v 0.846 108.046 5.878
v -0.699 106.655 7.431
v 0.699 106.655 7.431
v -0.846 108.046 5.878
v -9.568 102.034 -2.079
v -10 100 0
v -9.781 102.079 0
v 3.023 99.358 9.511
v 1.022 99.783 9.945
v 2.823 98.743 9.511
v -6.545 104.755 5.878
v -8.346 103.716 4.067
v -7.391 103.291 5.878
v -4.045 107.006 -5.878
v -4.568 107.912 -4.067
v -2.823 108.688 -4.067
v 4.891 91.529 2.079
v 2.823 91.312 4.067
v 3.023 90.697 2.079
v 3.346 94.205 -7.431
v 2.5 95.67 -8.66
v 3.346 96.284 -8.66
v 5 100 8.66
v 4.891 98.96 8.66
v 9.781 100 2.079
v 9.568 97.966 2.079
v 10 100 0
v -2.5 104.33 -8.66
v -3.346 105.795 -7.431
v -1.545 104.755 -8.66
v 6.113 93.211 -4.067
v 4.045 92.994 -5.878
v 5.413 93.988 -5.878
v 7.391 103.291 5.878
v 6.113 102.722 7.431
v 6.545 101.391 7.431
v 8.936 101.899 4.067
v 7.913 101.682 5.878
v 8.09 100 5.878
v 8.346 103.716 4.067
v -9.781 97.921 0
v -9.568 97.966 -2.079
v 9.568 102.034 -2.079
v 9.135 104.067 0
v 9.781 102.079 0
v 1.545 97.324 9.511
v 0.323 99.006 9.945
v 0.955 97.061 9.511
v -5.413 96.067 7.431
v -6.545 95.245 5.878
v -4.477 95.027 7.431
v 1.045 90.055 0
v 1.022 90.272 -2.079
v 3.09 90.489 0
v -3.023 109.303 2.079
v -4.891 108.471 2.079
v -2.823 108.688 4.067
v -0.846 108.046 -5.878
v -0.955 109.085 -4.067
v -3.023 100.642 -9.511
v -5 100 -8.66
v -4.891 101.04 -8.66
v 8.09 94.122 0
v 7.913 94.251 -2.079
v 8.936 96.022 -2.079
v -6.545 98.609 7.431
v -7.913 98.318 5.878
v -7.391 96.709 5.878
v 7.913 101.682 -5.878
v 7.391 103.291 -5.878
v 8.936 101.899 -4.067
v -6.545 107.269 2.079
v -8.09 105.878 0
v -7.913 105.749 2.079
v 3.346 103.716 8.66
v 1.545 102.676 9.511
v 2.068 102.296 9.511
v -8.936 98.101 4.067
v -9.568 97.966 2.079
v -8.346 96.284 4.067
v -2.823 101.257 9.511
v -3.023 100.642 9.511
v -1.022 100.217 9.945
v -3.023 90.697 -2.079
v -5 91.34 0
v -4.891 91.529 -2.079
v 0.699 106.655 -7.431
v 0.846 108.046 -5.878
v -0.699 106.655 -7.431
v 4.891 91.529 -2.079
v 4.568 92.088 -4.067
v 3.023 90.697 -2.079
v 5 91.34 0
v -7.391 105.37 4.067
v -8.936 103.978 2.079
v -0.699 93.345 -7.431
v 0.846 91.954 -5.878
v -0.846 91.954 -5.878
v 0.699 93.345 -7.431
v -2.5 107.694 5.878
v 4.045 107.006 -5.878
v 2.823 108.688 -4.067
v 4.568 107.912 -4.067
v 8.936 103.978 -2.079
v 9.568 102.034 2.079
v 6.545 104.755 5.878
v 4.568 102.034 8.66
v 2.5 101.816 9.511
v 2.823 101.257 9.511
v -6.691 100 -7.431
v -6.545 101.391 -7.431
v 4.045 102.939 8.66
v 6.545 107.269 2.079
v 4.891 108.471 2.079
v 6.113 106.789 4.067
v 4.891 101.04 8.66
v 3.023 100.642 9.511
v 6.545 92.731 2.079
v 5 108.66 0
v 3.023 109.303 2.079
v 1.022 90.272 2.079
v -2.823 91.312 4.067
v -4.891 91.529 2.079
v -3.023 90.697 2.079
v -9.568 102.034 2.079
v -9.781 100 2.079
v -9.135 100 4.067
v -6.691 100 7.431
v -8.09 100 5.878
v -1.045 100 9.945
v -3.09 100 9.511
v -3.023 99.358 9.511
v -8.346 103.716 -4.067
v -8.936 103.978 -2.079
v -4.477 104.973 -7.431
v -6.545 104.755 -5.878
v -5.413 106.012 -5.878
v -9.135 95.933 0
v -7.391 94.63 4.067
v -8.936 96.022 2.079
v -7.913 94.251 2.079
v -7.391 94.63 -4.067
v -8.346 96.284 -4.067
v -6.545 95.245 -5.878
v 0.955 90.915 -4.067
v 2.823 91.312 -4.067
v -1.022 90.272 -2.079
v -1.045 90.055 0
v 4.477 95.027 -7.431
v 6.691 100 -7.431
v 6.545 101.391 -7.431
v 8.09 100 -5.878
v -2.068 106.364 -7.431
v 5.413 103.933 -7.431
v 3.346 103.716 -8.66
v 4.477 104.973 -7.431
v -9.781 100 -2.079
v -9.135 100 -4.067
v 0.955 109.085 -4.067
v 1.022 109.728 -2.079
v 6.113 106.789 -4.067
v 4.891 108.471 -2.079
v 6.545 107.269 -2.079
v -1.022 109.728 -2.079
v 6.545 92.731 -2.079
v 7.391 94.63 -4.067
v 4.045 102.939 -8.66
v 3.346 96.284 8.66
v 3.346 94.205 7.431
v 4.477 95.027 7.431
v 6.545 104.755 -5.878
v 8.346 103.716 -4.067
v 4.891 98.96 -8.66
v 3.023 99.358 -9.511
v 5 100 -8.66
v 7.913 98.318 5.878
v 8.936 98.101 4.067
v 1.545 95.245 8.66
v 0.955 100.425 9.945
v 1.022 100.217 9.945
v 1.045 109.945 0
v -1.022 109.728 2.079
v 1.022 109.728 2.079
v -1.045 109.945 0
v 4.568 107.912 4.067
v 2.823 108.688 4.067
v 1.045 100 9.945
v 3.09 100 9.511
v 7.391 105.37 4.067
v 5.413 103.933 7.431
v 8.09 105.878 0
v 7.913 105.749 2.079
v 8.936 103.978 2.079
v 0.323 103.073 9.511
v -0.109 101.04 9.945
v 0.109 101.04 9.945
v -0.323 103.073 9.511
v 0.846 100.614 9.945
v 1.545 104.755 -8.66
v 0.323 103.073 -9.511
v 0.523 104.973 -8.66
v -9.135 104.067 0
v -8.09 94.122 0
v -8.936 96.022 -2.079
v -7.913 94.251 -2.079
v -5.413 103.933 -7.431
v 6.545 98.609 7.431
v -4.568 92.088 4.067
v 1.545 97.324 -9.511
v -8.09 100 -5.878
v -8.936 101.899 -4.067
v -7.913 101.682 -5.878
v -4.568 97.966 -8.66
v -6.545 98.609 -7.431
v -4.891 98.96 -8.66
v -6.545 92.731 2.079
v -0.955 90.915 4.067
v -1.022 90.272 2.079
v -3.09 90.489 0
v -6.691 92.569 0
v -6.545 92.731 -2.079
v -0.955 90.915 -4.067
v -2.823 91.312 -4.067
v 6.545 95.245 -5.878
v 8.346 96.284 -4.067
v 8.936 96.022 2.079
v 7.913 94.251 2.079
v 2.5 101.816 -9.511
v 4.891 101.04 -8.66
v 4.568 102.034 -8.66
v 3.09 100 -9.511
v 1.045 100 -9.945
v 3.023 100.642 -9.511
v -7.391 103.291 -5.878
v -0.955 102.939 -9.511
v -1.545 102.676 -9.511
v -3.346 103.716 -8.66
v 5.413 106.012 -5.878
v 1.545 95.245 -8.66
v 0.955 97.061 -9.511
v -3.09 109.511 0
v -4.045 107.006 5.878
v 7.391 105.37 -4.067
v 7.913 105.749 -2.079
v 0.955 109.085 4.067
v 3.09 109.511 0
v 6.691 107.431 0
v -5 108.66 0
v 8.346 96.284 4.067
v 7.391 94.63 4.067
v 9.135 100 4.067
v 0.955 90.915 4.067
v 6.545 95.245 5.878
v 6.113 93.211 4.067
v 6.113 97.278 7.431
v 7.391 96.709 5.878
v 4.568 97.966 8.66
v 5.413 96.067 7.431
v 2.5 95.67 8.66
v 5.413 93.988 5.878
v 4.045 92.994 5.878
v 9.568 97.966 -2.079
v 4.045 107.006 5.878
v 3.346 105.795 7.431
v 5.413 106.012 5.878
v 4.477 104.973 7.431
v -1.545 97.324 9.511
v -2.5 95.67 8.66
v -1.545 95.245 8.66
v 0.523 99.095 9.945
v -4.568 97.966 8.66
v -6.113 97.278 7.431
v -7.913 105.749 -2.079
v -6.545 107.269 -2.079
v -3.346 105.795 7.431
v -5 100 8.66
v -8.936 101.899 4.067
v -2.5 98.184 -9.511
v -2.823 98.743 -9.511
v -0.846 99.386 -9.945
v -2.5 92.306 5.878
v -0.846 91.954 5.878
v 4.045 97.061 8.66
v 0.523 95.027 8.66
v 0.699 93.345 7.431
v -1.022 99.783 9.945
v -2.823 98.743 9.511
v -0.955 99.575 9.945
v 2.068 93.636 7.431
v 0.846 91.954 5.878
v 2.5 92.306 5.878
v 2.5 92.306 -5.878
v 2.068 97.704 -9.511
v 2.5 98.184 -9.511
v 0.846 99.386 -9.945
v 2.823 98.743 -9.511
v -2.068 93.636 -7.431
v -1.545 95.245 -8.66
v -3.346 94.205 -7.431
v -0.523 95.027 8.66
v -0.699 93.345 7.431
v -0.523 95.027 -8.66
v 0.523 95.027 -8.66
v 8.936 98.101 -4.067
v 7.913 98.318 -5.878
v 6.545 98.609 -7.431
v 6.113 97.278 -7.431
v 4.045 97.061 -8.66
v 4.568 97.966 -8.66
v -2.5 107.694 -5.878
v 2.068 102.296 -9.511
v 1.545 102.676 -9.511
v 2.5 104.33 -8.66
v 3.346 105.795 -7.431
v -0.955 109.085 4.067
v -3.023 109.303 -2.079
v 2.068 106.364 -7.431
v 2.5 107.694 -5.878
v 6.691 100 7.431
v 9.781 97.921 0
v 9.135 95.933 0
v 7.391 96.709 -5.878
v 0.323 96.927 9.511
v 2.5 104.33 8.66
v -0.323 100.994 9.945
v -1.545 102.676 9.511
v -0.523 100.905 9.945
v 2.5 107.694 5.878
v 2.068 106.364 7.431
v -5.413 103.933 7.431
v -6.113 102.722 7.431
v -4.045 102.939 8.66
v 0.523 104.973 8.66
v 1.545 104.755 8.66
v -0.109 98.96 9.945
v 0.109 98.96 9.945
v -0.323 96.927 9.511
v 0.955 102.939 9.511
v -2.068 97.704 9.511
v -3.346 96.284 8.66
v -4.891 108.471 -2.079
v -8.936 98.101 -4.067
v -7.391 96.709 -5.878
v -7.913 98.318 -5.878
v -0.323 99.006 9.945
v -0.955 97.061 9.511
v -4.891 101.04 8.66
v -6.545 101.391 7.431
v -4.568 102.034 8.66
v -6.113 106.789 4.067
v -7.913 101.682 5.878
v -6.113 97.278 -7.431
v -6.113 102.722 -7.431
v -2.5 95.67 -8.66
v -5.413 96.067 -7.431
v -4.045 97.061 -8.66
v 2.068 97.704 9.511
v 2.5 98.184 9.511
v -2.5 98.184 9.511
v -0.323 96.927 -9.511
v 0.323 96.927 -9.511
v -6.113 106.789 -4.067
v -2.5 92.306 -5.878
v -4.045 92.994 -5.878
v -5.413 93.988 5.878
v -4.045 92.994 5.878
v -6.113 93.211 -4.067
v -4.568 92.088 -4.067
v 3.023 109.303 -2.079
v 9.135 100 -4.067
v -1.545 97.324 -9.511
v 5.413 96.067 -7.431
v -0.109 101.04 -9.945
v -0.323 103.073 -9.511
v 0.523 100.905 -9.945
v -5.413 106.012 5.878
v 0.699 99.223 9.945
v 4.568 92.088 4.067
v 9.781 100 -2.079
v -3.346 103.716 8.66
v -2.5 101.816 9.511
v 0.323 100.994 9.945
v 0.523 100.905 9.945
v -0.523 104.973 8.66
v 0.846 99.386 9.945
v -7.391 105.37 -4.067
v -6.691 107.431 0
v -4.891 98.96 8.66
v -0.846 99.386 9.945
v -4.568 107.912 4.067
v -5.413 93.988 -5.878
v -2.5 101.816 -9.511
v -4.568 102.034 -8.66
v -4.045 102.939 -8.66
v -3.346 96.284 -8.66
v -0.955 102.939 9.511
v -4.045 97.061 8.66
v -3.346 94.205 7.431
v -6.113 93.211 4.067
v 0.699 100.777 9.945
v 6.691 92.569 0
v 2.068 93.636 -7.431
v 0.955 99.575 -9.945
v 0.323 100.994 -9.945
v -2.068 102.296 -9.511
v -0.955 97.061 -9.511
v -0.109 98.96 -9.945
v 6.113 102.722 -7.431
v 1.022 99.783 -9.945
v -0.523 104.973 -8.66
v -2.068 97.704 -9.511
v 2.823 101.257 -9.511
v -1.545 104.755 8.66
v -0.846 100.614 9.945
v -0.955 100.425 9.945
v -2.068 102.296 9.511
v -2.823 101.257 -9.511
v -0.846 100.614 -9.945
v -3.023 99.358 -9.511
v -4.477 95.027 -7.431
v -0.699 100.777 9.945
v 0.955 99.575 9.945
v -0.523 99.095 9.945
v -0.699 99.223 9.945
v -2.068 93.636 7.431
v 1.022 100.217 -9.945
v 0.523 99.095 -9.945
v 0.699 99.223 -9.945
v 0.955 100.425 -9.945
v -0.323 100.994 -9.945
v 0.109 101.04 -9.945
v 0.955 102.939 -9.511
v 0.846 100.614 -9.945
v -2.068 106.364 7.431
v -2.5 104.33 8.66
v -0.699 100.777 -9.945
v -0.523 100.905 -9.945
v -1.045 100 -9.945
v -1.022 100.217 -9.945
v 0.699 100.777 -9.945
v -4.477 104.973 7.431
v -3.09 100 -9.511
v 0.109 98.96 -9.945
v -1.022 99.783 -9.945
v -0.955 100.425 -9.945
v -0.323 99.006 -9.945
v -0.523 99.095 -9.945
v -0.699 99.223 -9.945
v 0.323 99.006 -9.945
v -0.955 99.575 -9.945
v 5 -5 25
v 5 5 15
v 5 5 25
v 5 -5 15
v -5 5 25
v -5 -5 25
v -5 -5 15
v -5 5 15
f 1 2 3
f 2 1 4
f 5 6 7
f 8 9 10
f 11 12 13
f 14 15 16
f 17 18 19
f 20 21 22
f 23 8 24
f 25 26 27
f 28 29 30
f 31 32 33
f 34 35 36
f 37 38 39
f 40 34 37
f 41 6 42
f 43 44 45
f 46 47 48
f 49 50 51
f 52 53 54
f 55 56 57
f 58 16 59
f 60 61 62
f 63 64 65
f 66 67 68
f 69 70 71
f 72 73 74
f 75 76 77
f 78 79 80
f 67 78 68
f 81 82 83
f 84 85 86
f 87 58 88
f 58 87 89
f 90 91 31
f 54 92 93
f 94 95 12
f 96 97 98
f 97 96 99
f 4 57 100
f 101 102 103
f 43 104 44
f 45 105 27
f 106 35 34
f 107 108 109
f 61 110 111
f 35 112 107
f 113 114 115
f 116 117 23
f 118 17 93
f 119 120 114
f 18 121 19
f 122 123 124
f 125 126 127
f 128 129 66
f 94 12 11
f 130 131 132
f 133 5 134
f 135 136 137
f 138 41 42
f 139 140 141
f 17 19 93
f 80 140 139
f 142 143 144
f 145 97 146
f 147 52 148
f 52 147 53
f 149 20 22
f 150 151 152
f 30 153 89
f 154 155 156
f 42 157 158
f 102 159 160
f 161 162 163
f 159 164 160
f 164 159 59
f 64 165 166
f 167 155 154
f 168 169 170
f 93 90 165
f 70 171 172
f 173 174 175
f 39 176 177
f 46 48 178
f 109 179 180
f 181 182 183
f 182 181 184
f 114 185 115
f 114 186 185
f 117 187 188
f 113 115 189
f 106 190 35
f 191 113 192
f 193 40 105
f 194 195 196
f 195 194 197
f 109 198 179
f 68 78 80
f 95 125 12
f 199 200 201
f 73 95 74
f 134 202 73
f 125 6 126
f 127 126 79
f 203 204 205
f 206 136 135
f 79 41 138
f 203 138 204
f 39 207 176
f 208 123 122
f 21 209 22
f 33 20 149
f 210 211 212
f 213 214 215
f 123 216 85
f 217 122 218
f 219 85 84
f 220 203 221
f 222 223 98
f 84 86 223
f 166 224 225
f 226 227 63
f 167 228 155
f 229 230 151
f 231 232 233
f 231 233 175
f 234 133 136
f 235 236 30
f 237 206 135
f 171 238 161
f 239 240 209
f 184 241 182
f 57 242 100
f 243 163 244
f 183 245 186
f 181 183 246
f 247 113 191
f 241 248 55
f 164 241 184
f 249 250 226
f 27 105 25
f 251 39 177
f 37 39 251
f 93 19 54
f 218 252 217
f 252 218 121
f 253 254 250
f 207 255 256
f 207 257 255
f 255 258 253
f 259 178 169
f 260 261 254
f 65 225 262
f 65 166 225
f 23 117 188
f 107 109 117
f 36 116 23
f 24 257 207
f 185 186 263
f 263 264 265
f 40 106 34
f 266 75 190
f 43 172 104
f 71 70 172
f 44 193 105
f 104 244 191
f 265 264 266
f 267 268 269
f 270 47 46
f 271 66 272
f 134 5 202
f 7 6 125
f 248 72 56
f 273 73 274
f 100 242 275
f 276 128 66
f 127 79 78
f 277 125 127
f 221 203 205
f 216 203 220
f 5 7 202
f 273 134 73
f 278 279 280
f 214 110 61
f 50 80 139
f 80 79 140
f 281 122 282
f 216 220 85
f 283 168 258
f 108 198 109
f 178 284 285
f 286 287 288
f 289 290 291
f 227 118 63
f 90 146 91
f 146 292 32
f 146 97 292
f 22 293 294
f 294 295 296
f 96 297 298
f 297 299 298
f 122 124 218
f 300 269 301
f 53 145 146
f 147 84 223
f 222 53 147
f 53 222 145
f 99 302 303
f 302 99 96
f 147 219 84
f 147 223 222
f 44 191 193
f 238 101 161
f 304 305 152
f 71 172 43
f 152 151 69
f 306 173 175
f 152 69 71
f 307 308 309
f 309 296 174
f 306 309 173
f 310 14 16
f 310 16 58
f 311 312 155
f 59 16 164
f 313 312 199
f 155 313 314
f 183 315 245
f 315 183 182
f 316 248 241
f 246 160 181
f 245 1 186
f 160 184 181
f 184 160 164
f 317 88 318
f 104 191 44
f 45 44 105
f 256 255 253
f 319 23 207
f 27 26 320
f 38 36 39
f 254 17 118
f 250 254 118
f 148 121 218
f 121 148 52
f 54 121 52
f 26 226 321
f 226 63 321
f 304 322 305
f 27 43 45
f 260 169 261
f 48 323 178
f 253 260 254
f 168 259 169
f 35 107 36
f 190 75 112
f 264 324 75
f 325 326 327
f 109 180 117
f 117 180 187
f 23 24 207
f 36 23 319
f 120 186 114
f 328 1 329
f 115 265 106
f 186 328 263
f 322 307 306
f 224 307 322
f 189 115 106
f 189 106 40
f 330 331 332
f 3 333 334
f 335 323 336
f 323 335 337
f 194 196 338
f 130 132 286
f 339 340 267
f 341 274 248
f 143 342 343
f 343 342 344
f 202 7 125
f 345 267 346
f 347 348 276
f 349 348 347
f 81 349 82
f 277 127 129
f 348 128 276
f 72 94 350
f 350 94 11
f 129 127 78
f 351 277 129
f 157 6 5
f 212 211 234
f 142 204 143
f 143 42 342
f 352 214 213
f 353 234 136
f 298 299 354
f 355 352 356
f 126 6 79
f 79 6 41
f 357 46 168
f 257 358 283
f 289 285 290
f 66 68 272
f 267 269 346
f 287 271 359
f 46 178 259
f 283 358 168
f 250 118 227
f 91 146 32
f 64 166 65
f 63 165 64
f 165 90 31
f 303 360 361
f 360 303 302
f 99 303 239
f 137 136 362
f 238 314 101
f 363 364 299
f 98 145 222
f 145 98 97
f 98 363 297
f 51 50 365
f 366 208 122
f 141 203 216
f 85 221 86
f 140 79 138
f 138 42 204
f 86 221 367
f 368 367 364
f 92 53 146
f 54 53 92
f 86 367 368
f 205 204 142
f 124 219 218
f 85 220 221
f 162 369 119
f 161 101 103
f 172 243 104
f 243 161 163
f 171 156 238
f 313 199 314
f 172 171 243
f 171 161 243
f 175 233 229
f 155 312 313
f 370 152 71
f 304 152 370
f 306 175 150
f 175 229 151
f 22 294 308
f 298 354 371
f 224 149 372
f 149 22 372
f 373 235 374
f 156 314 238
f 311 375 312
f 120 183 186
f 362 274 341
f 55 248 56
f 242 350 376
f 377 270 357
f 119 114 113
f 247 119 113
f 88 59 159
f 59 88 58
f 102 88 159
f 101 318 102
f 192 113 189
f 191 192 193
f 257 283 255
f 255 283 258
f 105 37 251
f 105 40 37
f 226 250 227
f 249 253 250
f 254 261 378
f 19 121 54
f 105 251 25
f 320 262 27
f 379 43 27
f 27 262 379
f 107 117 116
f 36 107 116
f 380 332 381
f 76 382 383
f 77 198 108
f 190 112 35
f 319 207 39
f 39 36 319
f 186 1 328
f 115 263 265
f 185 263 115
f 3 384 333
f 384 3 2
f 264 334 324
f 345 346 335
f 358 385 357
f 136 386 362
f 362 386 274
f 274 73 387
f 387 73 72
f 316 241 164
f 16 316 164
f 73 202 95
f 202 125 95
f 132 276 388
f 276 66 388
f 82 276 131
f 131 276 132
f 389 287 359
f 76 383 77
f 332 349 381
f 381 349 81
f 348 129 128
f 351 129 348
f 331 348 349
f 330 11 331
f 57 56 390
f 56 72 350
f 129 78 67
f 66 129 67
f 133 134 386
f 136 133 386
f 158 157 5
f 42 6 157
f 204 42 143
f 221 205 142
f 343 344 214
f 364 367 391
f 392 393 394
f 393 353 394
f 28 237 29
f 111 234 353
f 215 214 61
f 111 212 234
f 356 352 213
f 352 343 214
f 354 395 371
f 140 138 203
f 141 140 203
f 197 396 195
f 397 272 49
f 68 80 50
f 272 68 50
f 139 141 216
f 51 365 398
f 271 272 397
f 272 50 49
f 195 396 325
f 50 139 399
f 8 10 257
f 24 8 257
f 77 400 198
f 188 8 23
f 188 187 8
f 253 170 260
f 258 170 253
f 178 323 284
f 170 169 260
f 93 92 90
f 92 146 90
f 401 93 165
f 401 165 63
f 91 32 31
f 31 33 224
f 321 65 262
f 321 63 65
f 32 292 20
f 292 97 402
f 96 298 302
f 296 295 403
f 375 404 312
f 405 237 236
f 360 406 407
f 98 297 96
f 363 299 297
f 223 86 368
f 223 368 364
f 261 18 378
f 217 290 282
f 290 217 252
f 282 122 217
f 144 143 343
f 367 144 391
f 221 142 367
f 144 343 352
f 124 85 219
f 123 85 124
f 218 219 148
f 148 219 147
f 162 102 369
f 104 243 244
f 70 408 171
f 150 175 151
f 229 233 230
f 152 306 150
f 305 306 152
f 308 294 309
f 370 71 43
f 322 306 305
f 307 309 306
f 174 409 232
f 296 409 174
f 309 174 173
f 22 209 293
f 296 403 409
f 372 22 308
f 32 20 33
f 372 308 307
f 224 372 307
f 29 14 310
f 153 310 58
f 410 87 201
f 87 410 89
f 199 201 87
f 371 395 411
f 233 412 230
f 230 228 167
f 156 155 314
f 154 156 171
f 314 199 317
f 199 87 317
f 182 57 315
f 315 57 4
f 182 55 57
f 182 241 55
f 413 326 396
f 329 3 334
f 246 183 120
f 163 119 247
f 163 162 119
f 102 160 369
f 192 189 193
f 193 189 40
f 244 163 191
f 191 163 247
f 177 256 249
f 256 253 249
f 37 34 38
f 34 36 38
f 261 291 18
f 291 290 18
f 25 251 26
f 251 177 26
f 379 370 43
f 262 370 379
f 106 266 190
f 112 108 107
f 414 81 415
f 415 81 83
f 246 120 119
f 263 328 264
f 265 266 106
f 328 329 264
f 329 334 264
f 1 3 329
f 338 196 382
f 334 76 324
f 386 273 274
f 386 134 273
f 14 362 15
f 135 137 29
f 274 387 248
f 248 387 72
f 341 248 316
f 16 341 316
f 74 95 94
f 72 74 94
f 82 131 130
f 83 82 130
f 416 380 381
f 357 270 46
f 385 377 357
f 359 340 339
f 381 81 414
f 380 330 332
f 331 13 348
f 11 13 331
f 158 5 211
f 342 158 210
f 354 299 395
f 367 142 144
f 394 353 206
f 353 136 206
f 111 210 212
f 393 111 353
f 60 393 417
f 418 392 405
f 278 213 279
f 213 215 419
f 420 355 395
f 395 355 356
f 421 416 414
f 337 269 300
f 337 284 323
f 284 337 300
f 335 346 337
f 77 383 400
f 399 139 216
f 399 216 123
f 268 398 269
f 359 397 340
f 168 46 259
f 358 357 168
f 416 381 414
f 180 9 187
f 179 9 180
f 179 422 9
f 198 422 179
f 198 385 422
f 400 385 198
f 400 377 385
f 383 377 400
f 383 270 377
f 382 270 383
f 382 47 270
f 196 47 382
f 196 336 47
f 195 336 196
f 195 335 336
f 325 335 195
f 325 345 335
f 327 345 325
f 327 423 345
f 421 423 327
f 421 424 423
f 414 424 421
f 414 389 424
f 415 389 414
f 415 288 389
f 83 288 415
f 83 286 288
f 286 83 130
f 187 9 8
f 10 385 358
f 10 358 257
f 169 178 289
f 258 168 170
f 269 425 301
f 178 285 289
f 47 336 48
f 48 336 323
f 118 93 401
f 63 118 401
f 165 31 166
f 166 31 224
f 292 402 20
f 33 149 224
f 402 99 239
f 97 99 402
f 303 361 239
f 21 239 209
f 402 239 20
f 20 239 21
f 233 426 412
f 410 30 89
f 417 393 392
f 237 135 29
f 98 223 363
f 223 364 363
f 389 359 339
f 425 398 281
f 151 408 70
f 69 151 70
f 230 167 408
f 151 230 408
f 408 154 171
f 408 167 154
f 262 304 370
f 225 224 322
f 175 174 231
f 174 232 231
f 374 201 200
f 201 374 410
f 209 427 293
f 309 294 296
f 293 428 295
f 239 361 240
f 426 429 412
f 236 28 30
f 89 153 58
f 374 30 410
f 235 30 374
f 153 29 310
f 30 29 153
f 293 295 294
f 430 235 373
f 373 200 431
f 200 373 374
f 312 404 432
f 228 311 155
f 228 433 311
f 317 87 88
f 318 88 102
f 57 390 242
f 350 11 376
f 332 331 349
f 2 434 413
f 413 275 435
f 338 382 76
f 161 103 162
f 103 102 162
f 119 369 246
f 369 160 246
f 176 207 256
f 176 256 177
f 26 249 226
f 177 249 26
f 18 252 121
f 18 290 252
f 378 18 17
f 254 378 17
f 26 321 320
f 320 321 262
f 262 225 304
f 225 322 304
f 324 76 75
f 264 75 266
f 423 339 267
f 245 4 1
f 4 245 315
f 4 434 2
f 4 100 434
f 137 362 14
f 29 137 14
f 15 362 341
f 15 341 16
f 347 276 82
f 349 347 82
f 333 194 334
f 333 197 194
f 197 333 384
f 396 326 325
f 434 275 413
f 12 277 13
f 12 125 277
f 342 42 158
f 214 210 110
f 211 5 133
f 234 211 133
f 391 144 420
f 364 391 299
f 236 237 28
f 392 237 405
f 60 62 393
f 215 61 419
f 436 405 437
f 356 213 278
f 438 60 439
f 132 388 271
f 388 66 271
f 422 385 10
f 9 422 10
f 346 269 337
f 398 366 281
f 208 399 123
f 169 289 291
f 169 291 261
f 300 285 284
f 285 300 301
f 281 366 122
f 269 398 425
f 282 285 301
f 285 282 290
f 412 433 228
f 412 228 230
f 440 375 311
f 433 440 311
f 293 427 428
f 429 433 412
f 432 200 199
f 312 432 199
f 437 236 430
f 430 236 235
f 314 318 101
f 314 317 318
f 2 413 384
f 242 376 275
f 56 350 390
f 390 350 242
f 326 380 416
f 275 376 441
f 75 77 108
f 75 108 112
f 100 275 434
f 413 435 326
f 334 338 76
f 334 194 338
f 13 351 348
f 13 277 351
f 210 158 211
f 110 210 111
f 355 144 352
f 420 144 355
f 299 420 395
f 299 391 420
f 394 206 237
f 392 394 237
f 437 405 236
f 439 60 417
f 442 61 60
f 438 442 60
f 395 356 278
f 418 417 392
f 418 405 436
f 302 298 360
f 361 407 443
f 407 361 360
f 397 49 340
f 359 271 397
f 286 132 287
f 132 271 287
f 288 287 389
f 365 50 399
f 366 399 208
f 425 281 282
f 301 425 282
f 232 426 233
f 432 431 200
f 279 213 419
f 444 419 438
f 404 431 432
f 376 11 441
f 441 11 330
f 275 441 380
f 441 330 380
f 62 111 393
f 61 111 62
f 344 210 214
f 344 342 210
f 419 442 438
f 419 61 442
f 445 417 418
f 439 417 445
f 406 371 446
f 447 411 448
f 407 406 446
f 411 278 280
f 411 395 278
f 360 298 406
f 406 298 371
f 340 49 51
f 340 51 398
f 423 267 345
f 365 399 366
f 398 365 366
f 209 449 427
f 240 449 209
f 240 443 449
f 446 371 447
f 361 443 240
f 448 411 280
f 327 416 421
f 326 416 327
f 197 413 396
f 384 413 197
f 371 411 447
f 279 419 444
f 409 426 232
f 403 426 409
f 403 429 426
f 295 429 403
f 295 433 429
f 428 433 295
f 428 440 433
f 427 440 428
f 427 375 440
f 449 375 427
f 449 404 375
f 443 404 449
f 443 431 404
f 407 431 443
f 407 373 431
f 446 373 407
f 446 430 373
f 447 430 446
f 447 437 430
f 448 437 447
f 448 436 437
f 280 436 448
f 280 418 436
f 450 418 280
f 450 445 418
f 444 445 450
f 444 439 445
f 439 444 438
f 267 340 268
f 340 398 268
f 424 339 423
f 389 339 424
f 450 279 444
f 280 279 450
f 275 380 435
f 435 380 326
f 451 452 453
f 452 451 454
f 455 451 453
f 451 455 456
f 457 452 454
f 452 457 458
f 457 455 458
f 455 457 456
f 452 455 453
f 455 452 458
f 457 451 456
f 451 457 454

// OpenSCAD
rotate([0, 0, $t*360]) {
    translate([0, 100, 0]) sphere(10);
    translate([0, 0, 20]) cube(10, center=true);
} 
